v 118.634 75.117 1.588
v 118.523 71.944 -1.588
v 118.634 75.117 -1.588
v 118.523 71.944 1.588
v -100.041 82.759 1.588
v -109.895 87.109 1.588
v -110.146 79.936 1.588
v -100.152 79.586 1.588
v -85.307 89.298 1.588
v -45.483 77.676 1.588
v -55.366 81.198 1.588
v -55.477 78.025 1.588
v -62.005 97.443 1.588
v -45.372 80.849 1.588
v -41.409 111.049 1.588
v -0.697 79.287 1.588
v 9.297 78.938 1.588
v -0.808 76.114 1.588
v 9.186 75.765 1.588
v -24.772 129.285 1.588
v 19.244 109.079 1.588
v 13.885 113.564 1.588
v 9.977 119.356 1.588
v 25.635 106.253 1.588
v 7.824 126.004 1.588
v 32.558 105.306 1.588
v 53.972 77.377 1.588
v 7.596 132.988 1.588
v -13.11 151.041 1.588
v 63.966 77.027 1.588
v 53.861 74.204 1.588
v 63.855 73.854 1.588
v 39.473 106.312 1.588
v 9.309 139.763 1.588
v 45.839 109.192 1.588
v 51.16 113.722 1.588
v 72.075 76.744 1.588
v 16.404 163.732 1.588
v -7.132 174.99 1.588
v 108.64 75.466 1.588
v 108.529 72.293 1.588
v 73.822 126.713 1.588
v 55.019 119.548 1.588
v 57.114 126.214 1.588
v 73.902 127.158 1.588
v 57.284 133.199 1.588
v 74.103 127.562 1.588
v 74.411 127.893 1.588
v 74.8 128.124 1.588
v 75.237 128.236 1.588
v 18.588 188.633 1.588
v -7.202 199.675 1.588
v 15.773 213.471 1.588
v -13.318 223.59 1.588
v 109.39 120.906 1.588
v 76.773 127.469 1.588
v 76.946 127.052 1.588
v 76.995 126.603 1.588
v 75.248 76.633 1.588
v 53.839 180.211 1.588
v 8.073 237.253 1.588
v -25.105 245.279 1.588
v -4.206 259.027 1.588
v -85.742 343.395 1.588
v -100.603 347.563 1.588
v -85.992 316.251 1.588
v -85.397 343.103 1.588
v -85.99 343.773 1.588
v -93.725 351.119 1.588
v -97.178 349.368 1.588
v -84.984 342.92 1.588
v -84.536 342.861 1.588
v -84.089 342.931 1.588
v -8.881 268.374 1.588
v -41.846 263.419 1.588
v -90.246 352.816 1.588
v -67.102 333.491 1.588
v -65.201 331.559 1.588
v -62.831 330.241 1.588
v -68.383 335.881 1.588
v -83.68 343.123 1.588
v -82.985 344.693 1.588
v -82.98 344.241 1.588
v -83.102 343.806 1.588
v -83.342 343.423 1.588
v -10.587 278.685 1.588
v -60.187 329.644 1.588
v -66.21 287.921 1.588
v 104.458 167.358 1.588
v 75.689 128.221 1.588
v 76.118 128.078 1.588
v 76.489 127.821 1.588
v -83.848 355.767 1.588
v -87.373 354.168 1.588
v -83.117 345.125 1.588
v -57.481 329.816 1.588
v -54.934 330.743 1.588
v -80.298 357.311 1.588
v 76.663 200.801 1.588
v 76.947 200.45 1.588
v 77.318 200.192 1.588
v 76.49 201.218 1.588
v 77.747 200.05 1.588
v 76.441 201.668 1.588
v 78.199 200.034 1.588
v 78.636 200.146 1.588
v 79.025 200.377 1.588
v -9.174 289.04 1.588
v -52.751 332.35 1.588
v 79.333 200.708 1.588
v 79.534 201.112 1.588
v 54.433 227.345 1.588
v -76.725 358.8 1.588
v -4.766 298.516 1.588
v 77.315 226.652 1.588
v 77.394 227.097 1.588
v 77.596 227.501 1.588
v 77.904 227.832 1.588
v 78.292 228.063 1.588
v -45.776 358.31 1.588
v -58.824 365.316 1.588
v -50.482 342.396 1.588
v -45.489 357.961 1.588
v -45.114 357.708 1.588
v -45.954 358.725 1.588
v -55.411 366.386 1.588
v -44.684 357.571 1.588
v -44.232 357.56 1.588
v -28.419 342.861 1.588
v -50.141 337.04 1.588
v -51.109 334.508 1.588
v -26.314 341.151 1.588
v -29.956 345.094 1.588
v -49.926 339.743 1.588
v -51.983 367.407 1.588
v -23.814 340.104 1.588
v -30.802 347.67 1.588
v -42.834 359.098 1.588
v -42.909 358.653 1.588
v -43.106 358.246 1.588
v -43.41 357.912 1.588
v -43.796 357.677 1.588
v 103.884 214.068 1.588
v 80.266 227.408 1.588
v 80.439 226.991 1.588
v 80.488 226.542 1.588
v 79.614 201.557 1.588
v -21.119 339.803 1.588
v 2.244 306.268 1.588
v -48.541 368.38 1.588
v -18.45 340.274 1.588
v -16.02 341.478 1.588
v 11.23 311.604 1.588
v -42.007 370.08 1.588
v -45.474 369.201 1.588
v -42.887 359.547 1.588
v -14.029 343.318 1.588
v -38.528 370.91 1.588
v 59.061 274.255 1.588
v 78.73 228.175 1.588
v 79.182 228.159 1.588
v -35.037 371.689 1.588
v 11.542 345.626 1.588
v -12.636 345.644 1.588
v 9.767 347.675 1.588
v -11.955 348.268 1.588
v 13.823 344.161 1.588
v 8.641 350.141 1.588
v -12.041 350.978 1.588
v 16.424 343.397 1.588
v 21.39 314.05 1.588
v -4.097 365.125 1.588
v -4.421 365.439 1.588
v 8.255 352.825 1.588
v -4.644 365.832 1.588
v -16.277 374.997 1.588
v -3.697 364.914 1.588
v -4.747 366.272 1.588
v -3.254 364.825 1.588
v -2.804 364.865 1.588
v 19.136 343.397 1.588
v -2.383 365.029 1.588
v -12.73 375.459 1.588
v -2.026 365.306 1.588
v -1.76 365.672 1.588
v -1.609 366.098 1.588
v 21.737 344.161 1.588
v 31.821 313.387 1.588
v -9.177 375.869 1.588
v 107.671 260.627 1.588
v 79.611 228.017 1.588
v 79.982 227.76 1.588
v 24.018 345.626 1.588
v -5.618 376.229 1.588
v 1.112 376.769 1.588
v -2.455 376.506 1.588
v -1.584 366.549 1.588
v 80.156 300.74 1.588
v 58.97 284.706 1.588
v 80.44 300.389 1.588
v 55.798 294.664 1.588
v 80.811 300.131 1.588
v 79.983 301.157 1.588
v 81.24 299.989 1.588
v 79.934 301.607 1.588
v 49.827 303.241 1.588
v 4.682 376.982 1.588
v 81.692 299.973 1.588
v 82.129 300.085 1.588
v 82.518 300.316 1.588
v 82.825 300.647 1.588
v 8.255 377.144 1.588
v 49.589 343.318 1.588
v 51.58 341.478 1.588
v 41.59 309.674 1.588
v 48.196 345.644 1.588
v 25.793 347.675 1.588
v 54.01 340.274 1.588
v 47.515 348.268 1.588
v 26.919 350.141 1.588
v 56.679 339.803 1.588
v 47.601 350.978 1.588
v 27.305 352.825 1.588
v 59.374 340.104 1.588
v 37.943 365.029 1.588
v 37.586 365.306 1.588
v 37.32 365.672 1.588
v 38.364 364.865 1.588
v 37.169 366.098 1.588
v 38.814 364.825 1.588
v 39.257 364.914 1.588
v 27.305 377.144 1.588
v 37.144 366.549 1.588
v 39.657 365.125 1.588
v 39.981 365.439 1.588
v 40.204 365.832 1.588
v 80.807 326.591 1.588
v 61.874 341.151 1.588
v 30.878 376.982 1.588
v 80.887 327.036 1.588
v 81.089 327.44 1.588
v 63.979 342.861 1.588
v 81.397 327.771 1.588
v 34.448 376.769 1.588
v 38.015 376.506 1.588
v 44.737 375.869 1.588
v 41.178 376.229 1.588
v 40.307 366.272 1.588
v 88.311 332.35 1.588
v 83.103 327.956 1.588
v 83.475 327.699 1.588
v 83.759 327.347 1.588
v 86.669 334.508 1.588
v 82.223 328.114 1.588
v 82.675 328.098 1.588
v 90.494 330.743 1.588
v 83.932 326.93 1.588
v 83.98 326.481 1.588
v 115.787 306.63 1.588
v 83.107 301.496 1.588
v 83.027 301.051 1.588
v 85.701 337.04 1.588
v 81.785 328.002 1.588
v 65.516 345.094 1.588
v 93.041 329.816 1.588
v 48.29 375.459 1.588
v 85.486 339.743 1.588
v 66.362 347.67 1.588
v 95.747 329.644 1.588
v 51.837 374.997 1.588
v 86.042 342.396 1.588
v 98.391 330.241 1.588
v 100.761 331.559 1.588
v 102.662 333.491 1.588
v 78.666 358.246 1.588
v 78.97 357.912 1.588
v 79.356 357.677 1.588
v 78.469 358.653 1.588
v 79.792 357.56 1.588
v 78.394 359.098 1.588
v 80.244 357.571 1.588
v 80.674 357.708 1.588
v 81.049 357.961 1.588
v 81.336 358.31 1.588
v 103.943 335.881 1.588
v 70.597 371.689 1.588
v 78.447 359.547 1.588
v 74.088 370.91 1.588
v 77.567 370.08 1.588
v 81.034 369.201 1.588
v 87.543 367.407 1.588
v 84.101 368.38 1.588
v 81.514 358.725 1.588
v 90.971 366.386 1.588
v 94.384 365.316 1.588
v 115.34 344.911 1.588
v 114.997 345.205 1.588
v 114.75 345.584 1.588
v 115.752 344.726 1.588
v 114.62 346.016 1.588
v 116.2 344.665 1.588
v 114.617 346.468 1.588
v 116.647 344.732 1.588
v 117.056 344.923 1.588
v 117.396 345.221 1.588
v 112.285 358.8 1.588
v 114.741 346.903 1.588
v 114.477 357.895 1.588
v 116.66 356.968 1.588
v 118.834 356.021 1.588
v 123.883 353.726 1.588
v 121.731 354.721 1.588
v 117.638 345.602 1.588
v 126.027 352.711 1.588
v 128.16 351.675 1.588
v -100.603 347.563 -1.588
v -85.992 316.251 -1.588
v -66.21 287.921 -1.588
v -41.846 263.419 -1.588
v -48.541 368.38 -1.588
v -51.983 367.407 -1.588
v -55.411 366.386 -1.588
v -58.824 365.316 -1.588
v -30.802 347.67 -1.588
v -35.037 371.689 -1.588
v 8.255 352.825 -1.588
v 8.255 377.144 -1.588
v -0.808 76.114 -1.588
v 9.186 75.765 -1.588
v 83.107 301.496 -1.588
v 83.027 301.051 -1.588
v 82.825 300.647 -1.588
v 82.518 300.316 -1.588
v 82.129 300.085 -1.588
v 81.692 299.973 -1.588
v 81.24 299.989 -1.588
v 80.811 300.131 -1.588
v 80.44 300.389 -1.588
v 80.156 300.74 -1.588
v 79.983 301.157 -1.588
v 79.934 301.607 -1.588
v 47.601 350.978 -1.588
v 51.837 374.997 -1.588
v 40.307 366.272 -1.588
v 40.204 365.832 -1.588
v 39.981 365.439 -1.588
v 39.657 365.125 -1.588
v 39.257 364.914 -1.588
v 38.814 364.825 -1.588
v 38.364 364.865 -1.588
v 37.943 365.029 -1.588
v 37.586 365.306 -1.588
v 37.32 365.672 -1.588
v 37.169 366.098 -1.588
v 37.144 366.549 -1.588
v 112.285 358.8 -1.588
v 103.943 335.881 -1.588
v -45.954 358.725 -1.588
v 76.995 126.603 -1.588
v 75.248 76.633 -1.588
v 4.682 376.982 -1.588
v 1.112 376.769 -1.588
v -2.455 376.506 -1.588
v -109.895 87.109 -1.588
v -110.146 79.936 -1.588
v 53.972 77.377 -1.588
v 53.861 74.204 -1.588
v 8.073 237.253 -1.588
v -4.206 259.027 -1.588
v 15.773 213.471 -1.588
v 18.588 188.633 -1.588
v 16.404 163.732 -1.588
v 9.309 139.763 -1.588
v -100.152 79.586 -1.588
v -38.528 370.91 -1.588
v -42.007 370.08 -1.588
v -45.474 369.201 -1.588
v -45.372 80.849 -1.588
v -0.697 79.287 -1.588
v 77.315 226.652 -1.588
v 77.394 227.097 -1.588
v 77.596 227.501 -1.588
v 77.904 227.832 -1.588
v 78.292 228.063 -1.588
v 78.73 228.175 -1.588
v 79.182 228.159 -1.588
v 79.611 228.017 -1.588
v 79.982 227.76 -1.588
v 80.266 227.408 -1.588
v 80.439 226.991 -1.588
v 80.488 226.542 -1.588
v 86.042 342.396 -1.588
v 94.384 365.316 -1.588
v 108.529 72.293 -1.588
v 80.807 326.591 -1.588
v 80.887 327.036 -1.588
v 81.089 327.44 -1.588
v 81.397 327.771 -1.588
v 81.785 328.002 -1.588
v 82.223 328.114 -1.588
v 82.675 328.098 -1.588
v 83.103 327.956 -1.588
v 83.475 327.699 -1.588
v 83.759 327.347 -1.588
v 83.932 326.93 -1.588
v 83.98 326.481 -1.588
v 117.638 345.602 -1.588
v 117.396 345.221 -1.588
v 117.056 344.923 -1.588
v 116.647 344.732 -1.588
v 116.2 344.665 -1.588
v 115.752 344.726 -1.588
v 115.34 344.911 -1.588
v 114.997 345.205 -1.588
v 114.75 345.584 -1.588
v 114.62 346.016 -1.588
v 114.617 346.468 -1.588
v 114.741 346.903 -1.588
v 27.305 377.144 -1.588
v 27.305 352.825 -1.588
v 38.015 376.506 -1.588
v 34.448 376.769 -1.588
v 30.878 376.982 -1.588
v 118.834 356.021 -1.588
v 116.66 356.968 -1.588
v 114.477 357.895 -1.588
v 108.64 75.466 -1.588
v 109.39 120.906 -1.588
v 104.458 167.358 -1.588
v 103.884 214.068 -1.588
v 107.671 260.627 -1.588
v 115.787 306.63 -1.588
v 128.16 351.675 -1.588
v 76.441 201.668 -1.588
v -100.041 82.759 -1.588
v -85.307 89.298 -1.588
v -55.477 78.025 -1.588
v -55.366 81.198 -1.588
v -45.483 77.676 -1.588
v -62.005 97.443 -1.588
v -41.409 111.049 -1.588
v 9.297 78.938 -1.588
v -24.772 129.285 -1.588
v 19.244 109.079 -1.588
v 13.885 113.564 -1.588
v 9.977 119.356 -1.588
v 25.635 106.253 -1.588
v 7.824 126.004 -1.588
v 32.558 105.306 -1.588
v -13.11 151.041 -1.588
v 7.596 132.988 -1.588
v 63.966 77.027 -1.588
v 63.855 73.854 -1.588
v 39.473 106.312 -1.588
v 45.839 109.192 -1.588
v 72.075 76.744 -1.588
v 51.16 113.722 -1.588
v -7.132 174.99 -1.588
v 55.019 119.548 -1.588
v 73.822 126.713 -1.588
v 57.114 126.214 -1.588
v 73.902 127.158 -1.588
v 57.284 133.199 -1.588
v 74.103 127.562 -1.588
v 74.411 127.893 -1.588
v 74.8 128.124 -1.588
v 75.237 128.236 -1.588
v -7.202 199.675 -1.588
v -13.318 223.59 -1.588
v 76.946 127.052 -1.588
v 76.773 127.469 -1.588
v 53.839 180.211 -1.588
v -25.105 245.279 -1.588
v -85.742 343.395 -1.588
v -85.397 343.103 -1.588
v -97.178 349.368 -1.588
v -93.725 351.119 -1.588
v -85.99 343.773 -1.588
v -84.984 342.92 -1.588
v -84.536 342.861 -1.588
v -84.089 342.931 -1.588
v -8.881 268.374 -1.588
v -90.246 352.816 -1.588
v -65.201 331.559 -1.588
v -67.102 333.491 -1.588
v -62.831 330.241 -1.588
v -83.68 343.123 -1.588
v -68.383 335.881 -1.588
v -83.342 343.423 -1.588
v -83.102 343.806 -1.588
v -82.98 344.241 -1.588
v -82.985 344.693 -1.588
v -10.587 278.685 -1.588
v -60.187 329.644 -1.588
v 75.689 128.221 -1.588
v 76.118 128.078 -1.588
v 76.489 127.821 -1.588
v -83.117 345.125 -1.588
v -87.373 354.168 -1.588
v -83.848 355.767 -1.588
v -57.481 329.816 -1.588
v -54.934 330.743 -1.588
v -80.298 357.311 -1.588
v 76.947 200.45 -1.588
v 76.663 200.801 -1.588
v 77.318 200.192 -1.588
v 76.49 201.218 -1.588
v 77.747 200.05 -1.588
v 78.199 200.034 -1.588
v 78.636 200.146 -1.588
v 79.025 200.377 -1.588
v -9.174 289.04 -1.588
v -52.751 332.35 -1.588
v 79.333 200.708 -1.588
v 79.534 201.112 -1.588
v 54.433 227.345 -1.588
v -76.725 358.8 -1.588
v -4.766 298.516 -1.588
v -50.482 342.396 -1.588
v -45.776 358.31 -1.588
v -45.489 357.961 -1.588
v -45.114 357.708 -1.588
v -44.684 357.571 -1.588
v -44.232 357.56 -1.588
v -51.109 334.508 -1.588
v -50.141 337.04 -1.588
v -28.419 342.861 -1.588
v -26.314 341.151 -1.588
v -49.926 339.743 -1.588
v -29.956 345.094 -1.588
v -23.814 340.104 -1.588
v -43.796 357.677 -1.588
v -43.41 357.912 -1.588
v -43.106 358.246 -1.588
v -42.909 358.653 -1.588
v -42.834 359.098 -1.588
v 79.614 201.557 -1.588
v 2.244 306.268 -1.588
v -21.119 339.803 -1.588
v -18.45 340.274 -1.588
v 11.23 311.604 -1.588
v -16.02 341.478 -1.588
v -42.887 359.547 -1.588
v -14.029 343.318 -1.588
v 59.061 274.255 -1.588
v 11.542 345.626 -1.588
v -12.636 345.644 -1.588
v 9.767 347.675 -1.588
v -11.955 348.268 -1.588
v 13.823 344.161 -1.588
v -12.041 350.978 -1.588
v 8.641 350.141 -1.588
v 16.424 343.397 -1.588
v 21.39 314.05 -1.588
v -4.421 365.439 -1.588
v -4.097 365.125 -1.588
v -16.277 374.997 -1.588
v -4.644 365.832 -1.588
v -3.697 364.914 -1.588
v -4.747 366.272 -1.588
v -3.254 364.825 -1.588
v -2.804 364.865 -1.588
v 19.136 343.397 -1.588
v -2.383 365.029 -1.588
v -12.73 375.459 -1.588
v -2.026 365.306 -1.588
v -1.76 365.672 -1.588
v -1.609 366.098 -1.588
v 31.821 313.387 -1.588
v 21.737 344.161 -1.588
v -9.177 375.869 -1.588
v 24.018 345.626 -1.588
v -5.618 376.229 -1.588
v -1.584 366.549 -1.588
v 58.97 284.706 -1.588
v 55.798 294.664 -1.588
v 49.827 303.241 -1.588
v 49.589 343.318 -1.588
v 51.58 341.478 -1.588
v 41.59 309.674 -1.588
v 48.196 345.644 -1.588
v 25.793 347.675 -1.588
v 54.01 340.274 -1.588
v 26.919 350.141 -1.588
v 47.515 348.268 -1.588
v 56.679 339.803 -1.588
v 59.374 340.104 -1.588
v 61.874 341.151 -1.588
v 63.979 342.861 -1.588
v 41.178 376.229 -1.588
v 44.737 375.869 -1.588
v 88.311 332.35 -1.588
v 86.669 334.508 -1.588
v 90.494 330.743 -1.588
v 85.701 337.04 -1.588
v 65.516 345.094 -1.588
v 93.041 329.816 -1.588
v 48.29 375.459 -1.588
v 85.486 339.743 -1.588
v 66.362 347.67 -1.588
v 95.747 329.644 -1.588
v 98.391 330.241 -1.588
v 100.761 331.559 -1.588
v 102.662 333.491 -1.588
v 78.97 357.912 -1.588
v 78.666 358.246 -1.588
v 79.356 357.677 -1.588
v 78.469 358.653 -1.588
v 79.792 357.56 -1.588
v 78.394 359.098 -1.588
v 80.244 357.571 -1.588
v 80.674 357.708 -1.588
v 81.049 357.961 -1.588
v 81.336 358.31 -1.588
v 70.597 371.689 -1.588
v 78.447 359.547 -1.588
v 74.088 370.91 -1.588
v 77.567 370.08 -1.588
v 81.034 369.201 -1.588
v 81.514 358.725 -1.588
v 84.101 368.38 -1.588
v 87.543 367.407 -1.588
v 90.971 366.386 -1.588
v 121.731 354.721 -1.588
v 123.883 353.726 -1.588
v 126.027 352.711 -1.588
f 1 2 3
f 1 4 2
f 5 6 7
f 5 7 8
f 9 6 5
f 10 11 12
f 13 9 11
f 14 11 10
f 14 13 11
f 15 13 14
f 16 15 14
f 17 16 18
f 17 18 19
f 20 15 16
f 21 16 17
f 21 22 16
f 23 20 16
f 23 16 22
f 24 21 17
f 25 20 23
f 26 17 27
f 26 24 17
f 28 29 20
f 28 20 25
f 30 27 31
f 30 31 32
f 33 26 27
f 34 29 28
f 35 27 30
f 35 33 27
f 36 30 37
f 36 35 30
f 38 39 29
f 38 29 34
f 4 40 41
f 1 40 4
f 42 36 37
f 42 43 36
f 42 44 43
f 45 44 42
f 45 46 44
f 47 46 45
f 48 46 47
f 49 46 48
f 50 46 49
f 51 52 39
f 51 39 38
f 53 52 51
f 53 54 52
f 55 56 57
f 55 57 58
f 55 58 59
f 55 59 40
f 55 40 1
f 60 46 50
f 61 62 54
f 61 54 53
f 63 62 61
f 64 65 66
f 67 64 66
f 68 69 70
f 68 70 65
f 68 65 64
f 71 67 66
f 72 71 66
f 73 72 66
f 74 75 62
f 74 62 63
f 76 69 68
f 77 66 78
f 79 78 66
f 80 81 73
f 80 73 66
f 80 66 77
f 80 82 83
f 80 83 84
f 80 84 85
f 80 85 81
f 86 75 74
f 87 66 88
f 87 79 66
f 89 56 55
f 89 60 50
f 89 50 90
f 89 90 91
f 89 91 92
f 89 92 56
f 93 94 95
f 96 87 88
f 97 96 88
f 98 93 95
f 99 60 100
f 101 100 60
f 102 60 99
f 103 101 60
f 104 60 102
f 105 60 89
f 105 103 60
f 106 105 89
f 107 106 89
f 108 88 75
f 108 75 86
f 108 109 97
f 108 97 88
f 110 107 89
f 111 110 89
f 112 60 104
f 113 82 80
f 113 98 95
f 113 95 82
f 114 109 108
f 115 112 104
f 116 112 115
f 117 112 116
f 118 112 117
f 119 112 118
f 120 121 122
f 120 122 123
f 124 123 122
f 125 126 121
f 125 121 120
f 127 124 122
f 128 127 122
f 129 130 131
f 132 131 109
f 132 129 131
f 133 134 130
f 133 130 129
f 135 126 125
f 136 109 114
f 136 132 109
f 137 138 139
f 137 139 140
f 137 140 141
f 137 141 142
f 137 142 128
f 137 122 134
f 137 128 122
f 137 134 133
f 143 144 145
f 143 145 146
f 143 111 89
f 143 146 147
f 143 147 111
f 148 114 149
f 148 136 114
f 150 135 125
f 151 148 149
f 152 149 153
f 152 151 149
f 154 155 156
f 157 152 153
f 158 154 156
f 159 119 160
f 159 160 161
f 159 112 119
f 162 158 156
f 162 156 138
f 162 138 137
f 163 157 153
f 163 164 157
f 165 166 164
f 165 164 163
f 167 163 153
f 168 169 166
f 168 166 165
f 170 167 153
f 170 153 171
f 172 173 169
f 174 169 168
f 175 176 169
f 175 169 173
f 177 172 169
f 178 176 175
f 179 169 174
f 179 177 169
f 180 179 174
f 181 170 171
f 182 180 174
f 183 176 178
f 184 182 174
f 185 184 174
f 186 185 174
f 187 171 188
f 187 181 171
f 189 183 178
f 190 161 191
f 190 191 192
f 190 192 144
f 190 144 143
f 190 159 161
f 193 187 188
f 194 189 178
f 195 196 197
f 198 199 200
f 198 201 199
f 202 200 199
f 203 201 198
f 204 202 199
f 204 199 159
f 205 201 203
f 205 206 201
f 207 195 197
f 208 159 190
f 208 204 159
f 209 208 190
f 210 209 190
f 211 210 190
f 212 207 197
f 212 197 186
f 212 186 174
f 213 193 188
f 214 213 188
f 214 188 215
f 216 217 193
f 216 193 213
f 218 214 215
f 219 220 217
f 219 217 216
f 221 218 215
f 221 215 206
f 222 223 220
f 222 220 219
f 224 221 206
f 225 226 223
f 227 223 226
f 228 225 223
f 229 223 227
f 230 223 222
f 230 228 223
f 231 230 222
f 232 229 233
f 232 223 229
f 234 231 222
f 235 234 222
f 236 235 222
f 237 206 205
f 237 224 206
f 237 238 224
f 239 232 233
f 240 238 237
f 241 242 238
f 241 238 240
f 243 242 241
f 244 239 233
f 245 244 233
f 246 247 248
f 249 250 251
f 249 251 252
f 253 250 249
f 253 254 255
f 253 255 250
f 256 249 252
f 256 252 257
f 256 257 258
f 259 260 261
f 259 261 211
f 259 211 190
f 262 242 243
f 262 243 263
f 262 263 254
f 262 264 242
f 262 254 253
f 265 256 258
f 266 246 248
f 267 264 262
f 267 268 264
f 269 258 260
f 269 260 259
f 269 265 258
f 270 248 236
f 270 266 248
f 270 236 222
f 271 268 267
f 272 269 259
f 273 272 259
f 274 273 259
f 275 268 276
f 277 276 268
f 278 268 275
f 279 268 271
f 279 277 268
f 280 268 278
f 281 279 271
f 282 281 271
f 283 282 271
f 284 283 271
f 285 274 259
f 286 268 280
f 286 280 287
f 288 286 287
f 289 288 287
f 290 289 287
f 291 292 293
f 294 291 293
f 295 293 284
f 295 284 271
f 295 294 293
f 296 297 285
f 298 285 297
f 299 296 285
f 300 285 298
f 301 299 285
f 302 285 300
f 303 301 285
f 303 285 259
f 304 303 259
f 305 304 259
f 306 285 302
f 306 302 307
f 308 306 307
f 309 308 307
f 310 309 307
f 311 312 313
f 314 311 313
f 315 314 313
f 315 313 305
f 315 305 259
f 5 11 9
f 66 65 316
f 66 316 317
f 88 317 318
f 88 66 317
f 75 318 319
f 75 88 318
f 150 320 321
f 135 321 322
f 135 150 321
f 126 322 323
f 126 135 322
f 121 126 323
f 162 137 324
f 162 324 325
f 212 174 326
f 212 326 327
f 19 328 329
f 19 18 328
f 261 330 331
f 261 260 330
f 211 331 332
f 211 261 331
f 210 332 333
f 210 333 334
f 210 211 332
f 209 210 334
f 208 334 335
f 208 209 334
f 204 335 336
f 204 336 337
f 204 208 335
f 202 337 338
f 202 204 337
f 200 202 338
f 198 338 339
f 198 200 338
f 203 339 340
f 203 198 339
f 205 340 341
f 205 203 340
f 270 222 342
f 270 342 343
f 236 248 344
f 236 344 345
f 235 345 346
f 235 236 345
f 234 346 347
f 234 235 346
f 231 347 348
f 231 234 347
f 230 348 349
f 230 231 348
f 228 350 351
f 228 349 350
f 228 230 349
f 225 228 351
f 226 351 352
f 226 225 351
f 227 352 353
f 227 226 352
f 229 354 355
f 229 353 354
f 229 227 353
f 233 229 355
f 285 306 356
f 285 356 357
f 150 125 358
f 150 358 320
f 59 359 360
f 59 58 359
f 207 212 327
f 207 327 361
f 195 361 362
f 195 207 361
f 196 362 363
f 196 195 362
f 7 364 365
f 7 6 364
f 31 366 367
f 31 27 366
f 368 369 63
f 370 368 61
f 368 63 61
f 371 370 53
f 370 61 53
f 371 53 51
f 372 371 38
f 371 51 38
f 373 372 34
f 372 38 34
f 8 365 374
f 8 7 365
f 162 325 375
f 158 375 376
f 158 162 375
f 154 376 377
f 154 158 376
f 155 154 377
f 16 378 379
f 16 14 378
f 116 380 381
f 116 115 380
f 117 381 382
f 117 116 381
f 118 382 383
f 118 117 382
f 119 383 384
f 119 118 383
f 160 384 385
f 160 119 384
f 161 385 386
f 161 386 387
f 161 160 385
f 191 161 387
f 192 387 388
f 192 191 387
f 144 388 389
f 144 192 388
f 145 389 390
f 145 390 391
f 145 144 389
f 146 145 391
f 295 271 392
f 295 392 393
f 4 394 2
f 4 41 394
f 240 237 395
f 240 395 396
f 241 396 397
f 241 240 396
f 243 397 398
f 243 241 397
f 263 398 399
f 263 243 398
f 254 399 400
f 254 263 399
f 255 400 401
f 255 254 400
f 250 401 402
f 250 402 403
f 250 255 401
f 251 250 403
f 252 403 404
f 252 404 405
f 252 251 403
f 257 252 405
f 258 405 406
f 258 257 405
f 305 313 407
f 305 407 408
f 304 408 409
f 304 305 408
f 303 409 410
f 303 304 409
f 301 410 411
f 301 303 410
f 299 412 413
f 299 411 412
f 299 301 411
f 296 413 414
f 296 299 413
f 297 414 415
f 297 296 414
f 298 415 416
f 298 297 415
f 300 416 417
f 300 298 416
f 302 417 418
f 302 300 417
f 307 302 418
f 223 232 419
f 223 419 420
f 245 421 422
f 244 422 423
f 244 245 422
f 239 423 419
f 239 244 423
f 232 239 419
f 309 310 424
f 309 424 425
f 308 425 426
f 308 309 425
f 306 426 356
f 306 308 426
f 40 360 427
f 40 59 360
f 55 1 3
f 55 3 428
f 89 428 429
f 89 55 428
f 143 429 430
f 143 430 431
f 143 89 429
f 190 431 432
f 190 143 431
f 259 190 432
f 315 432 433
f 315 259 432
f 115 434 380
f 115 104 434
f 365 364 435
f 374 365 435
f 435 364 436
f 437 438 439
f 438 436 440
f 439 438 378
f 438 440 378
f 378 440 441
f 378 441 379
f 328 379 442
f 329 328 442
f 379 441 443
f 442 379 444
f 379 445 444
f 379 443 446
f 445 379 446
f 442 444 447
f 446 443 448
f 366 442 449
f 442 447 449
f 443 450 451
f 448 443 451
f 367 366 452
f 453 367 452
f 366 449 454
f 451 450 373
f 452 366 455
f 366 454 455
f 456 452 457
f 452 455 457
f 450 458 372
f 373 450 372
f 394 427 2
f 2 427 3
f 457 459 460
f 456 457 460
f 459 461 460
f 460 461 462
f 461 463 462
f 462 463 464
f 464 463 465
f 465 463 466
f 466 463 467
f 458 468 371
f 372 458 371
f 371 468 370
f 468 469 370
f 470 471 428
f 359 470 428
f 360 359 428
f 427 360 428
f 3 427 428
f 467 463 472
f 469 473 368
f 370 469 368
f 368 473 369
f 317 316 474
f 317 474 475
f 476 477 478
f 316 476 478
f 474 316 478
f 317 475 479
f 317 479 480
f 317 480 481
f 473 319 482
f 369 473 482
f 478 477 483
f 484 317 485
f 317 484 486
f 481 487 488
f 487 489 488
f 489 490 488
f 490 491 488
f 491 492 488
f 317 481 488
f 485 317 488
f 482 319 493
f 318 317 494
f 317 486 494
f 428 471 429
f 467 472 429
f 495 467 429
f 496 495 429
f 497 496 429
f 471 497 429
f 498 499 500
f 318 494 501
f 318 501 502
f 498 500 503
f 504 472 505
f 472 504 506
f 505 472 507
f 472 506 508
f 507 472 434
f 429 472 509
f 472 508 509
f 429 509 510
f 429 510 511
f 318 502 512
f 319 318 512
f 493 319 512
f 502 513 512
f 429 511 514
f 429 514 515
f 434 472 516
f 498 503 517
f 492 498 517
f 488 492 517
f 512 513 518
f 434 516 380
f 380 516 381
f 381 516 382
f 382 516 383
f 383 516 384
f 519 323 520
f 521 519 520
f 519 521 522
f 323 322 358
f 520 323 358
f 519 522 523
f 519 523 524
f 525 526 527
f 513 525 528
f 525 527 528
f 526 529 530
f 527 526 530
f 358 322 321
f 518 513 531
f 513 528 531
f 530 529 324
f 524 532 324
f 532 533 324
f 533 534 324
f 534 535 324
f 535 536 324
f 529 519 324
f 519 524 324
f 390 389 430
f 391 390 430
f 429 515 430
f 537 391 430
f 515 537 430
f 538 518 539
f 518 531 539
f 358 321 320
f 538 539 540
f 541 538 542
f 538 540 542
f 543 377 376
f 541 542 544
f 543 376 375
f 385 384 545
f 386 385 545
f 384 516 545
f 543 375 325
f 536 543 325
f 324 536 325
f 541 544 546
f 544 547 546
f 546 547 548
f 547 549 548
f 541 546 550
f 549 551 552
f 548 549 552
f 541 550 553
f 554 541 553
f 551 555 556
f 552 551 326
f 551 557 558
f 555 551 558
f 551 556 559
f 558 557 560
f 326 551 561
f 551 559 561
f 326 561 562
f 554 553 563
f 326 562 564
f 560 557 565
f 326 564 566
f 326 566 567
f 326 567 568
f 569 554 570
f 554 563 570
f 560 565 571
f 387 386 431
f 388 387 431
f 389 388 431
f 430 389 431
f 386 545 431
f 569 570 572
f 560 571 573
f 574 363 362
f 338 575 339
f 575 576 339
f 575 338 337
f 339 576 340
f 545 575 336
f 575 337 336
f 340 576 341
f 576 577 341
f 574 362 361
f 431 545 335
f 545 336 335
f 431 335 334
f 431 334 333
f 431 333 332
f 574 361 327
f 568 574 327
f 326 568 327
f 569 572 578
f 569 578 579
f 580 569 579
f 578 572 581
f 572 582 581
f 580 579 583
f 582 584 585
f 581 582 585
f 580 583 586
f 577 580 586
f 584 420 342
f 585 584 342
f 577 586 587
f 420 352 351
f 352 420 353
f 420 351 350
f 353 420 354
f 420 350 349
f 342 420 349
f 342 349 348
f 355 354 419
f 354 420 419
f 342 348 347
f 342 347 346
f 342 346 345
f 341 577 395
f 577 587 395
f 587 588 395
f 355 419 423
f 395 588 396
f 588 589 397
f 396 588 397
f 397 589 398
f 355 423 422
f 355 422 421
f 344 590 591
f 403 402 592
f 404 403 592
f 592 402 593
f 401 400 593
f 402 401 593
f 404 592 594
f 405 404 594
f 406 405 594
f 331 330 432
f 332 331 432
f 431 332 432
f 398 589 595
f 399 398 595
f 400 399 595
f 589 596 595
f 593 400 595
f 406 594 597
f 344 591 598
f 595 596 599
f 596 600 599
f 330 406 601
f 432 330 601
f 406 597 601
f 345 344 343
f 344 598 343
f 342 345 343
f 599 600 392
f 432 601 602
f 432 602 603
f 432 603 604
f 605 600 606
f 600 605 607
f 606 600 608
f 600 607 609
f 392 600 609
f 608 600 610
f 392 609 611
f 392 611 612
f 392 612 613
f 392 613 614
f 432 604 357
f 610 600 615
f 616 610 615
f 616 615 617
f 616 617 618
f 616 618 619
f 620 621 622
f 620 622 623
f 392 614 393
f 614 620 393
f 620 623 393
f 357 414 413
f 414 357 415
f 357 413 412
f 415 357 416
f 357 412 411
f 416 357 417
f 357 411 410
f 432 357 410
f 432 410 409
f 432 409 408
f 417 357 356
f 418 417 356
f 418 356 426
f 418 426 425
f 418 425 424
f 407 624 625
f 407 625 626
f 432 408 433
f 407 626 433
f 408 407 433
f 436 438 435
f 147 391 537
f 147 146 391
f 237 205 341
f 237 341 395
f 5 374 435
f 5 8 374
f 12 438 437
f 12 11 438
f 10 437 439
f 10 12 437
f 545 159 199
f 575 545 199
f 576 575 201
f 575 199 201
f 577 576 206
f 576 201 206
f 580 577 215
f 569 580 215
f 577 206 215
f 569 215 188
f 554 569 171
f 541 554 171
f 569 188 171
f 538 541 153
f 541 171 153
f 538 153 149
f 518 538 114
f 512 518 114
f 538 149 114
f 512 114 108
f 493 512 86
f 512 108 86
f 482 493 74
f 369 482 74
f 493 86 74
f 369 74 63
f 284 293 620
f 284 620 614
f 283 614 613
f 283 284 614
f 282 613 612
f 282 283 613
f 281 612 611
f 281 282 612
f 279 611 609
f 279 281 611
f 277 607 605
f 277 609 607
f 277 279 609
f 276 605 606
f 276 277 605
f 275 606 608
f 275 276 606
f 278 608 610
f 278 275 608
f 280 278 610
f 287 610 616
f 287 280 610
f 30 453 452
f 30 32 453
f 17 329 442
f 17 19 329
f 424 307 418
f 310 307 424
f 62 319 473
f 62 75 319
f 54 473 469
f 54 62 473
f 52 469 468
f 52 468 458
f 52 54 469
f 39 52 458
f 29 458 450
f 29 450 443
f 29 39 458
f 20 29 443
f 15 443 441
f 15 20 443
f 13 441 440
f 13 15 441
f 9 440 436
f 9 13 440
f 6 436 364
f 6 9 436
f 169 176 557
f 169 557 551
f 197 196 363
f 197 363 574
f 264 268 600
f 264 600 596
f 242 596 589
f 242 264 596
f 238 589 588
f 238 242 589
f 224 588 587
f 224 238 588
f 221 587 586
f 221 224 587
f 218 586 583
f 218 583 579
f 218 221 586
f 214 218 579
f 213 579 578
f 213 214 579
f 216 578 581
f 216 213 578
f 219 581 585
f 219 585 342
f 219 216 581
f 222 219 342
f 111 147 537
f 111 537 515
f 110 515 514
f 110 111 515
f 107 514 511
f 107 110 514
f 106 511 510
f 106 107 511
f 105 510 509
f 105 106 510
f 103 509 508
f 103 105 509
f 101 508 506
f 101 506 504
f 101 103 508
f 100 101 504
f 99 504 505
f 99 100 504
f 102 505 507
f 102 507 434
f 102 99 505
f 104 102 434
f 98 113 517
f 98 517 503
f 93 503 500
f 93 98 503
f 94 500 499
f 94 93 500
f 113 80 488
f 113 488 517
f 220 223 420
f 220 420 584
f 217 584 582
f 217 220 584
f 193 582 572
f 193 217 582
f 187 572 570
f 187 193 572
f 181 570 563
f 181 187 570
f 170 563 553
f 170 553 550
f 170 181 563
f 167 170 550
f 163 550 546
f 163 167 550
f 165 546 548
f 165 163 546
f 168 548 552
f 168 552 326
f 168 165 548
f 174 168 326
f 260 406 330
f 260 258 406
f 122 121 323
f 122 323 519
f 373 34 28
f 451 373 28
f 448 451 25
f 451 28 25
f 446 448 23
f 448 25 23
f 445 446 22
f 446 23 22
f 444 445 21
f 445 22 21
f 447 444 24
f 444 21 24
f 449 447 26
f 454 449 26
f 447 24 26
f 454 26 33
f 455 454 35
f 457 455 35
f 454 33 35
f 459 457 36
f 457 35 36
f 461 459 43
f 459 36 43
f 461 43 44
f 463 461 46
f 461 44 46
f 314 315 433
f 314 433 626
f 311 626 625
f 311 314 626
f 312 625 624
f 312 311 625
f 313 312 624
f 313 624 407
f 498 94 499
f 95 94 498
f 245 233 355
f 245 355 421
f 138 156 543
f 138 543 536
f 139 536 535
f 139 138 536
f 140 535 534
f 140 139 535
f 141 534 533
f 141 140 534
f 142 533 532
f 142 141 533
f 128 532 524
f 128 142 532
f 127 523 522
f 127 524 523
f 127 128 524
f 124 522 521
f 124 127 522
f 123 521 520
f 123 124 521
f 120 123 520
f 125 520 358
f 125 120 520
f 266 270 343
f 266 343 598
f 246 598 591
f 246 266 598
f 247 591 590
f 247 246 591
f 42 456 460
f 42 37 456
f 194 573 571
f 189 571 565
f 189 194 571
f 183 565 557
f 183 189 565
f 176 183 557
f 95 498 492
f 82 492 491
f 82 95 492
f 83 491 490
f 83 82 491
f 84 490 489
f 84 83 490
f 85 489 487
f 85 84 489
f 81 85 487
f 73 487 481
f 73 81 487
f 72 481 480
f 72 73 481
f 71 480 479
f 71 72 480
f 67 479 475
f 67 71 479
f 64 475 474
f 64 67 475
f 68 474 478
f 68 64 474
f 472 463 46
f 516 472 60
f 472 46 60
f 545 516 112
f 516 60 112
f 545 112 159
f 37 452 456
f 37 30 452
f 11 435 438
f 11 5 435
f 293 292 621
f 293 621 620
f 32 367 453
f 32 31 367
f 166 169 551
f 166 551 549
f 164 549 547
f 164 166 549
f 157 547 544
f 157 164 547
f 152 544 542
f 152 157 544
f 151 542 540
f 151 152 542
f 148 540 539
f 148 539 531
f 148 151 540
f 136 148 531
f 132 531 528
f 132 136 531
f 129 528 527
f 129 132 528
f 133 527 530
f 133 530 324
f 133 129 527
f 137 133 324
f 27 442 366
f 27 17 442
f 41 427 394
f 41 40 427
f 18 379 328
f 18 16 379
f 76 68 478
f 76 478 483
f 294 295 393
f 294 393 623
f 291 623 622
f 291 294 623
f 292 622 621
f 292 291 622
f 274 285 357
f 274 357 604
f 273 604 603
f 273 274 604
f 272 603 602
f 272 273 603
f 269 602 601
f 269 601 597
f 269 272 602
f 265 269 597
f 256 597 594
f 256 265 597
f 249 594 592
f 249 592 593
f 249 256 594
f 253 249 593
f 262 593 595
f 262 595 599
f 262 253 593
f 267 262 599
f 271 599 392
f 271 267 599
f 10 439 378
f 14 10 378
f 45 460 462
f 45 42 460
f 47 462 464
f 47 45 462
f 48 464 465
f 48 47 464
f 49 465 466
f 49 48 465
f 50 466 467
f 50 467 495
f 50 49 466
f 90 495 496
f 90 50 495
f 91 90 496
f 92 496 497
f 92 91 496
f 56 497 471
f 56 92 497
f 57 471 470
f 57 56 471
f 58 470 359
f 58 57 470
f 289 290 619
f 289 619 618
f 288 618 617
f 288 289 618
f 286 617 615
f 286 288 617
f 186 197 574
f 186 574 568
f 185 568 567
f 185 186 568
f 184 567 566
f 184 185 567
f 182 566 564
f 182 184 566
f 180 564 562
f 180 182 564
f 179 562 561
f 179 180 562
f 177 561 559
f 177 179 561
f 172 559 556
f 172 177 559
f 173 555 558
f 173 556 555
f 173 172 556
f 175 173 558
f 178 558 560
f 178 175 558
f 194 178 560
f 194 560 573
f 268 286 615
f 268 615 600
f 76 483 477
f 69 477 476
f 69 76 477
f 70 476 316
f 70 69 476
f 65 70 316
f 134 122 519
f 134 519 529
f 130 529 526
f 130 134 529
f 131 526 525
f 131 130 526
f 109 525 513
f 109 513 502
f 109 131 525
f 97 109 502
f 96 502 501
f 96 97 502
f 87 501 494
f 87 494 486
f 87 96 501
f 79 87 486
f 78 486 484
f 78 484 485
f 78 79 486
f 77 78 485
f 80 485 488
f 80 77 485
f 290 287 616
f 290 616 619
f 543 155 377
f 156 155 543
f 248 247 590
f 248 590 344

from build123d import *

# Parameters (mm, degrees)
BOSS_EXTRUDE1_DEPTH = 1.5875
CUT_EXTRUDE1_DEPTH  = 10
CUT_EXTRUDE2_DEPTH  = 399.337162784


with BuildPart() as part:
    # Sketch1 → Boss-Extrude1 (new, symmetric)
    with BuildSketch(Plane.XY):
        with BuildLine():
            Line((118.523395286, 71.943678131), (118.634293919, 75.116740767))
            ThreePointArc((118.634293919, 75.116740767), (103.883786228, 214.067962894), (128.160173541, 351.674927204))
            ThreePointArc((128.160173541, 351.674927204), (120.284402828, 355.375683964), (112.284762731, 358.800464724))
            Line((112.284762731, 358.800464724), (103.942723114, 335.880899242))
            ThreePointArc((103.942723114, 335.880899242), (91.734409036, 330.188068894), (86.041578688, 342.396382972))
            Line((86.041578688, 342.396382972), (94.383618305, 365.315948454))
            ThreePointArc((94.383618305, 365.315948454), (82.568877465, 368.795382466), (70.597294753, 371.689474641))
            Line((70.597294753, 371.689474641), (66.36193024, 347.669528881))
            ThreePointArc((66.36193024, 347.669528881), (55.3276375, 339.943233926), (47.601342545, 350.977526666))
            Line((47.601342545, 350.977526666), (51.836707058, 374.997472425))
            ThreePointArc((51.836707058, 374.997472425), (39.597261303, 376.3724378), (27.305, 377.14371869))
            Line((27.305, 377.14371869), (27.305, 352.825))
            ThreePointArc((27.305, 352.825), (17.78, 343.3), (8.255, 352.825))
            Line((8.255, 352.825), (8.255, 377.14371869))
            ThreePointArc((8.255, 377.14371869), (-4.037261303, 376.3724378), (-16.276707058, 374.997472425))
            Line((-16.276707058, 374.997472425), (-12.041342545, 350.977526666))
            ThreePointArc((-12.041342545, 350.977526666), (-19.7676375, 339.943233926), (-30.80193024, 347.669528881))
            Line((-30.80193024, 347.669528881), (-35.037294753, 371.689474641))
            ThreePointArc((-35.037294753, 371.689474641), (-47.008877465, 368.795382466), (-58.823618305, 365.315948454))
            Line((-58.823618305, 365.315948454), (-50.481578688, 342.396382972))
            ThreePointArc((-50.481578688, 342.396382972), (-56.174409036, 330.188068894), (-68.382723114, 335.880899242))
            Line((-68.382723114, 335.880899242), (-76.724762731, 358.800464724))
            ThreePointArc((-76.724762731, 358.800464724), (-88.8119245, 353.496726812), (-100.602714669, 347.563230147))
            ThreePointArc((-100.602714669, 347.563230147), (-76.713636703, 301.658133404), (-41.846325708, 263.418931306))
            ThreePointArc((-41.846325708, 263.418931306), (-13.109519742, 151.040608787), (-109.894880363, 87.108728174))
            Line((-109.894880363, 87.108728174), (-110.145579114, 79.935665538))
            Line((-110.145579114, 79.935665538), (-100.151681047, 79.586378505))
            Line((-100.151681047, 79.586378505), (-100.040782415, 82.759441142))
            Line((-100.040782415, 82.759441142), (-55.365911398, 81.198053081))
            Line((-55.365911398, 81.198053081), (-55.476810031, 78.024990444))
            Line((-55.476810031, 78.024990444), (-45.482911964, 77.675703412))
            Line((-45.482911964, 77.675703412), (-45.372013331, 80.848766048))
            Line((-45.372013331, 80.848766048), (-0.697142315, 79.287377987))
            Line((-0.697142315, 79.287377987), (-0.808040947, 76.114315351))
            Line((-0.808040947, 76.114315351), (9.185857119, 75.765028318))
            Line((9.185857119, 75.765028318), (9.296755752, 78.938090955))
            Line((9.296755752, 78.938090955), (53.971626769, 77.376702893))
            Line((53.971626769, 77.376702893), (53.860728136, 74.203640257))
            Line((53.860728136, 74.203640257), (63.854626203, 73.854353225))
            Line((63.854626203, 73.854353225), (63.965524835, 77.027415861))
            Line((63.965524835, 77.027415861), (72.0752213, 76.74398173))
            Line((72.0752213, 76.74398173), (73.821656463, 126.713472064))
            ThreePointArc((73.821656463, 126.713472064), (75.463637097, 128.244554066), (76.994719099, 126.602573431))
            Line((76.994719099, 126.602573431), (75.248283936, 76.633083097))
            Line((75.248283936, 76.633083097), (108.640395852, 75.4660278))
            Line((108.640395852, 75.4660278), (108.529497219, 72.292965164))
            Line((108.529497219, 72.292965164), (118.523395286, 71.943678131))
        make_face()
        with BuildLine():
            Line((79.934179532, 301.606688232), (80.807397113, 326.591433399))
            ThreePointArc((80.807397113, 326.591433399), (82.449377747, 328.122515401), (83.980459749, 326.480534766))
            Line((83.980459749, 326.480534766), (83.107242168, 301.4957896))
            ThreePointArc((83.107242168, 301.4957896), (81.465261533, 299.964707598), (79.934179532, 301.606688232))
        make_face(mode=Mode.SUBTRACT)
        with BuildLine():
            ThreePointArc((79.614371843, 201.556808932), (77.972391208, 200.02572693), (76.441309207, 201.667707565))
            Line((76.441309207, 201.667707565), (77.314526788, 226.652452732))
            ThreePointArc((77.314526788, 226.652452732), (78.956507422, 228.183534733), (80.487589424, 226.541554099))
            Line((80.487589424, 226.541554099), (79.614371843, 201.556808932))
        make_face(mode=Mode.SUBTRACT)
    extrude(amount=BOSS_EXTRUDE1_DEPTH, both=True)

    # Sketch2 → Cut-Extrude1 (cut)
    with BuildSketch(Plane.XY.offset(1.5875)):
        with BuildLine():
            ThreePointArc((59.060719004, 274.255221739), (16.218243133, 313.208722852), (-4.20589422, 259.026552342))
            ThreePointArc((-4.20589422, 259.026552342), (17.803012445, 201.122949157), (9.309397428, 139.762719868))
            ThreePointArc((9.309397428, 139.762719868), (29.062919552, 105.536460681), (57.283668785, 133.199211213))
            ThreePointArc((57.283668785, 133.199211213), (53.631087043, 203.784426197), (59.060719004, 274.255221739))
        make_face()
    extrude(amount=-CUT_EXTRUDE1_DEPTH, mode=Mode.SUBTRACT)

    # Sketch3 → Cut-Extrude2 (cut, through all)
    with BuildSketch(Plane.XY.offset(1.5875)):
        with BuildLine():
            Line((-87.375537588, 354.172706758), (-83.117396192, 345.124600224))
            ThreePointArc((-83.117396192, 345.124600224), (-83.877803157, 343.012233365), (-85.990170016, 343.772640331))
            Line((-85.990170016, 343.772640331), (-90.248311413, 352.820746865))
            ThreePointArc((-90.248311413, 352.820746865), (-89.487904447, 354.933113724), (-87.375537588, 354.172706758))
        make_face()
        with BuildLine():
            Line((-45.475470216, 369.2062577), (-42.887279765, 359.546999437))
            ThreePointArc((-42.887279765, 359.546999437), (-44.00981178, 357.602716954), (-45.954094263, 358.725248969))
            Line((-45.954094263, 358.725248969), (-48.542284715, 368.384507232))
            ThreePointArc((-48.542284715, 368.384507232), (-47.419752699, 370.328789715), (-45.475470216, 369.2062577))
        make_face()
        with BuildLine():
            Line((-2.45580222, 376.510797541), (-1.584244793, 366.548850561))
            ThreePointArc((-1.584244793, 366.548850561), (-3.027344134, 364.829031736), (-4.747162959, 366.272131077))
            Line((-4.747162959, 366.272131077), (-5.618720387, 376.234078058))
            ThreePointArc((-5.618720387, 376.234078058), (-4.175621045, 377.953896883), (-2.45580222, 376.510797541))
        make_face()
        with BuildLine():
            Line((41.178720387, 376.234078058), (40.307162959, 366.272131077))
            ThreePointArc((40.307162959, 366.272131077), (38.587344134, 364.829031736), (37.144244793, 366.548850561))
            Line((37.144244793, 366.548850561), (38.01580222, 376.510797541))
            ThreePointArc((38.01580222, 376.510797541), (39.735621045, 377.953896883), (41.178720387, 376.234078058))
        make_face()
        with BuildLine():
            Line((84.102284715, 368.384507232), (81.514094263, 358.725248969))
            ThreePointArc((81.514094263, 358.725248969), (79.56981178, 357.602716954), (78.447279765, 359.546999437))
            Line((78.447279765, 359.546999437), (81.035470216, 369.2062577))
            ThreePointArc((81.035470216, 369.2062577), (82.979752699, 370.328789715), (84.102284715, 368.384507232))
        make_face()
        with BuildLine():
            Line((121.732705627, 354.725626081), (117.637852823, 345.60245884))
            ThreePointArc((117.637852823, 345.60245884), (115.539492141, 344.804213923), (114.741247224, 346.902574605))
            Line((114.741247224, 346.902574605), (118.836100028, 356.025741846))
            ThreePointArc((118.836100028, 356.025741846), (120.934460711, 356.823986763), (121.732705627, 354.725626081))
        make_face()
    extrude(amount=-CUT_EXTRUDE2_DEPTH, mode=Mode.SUBTRACT)


solid = part.part
